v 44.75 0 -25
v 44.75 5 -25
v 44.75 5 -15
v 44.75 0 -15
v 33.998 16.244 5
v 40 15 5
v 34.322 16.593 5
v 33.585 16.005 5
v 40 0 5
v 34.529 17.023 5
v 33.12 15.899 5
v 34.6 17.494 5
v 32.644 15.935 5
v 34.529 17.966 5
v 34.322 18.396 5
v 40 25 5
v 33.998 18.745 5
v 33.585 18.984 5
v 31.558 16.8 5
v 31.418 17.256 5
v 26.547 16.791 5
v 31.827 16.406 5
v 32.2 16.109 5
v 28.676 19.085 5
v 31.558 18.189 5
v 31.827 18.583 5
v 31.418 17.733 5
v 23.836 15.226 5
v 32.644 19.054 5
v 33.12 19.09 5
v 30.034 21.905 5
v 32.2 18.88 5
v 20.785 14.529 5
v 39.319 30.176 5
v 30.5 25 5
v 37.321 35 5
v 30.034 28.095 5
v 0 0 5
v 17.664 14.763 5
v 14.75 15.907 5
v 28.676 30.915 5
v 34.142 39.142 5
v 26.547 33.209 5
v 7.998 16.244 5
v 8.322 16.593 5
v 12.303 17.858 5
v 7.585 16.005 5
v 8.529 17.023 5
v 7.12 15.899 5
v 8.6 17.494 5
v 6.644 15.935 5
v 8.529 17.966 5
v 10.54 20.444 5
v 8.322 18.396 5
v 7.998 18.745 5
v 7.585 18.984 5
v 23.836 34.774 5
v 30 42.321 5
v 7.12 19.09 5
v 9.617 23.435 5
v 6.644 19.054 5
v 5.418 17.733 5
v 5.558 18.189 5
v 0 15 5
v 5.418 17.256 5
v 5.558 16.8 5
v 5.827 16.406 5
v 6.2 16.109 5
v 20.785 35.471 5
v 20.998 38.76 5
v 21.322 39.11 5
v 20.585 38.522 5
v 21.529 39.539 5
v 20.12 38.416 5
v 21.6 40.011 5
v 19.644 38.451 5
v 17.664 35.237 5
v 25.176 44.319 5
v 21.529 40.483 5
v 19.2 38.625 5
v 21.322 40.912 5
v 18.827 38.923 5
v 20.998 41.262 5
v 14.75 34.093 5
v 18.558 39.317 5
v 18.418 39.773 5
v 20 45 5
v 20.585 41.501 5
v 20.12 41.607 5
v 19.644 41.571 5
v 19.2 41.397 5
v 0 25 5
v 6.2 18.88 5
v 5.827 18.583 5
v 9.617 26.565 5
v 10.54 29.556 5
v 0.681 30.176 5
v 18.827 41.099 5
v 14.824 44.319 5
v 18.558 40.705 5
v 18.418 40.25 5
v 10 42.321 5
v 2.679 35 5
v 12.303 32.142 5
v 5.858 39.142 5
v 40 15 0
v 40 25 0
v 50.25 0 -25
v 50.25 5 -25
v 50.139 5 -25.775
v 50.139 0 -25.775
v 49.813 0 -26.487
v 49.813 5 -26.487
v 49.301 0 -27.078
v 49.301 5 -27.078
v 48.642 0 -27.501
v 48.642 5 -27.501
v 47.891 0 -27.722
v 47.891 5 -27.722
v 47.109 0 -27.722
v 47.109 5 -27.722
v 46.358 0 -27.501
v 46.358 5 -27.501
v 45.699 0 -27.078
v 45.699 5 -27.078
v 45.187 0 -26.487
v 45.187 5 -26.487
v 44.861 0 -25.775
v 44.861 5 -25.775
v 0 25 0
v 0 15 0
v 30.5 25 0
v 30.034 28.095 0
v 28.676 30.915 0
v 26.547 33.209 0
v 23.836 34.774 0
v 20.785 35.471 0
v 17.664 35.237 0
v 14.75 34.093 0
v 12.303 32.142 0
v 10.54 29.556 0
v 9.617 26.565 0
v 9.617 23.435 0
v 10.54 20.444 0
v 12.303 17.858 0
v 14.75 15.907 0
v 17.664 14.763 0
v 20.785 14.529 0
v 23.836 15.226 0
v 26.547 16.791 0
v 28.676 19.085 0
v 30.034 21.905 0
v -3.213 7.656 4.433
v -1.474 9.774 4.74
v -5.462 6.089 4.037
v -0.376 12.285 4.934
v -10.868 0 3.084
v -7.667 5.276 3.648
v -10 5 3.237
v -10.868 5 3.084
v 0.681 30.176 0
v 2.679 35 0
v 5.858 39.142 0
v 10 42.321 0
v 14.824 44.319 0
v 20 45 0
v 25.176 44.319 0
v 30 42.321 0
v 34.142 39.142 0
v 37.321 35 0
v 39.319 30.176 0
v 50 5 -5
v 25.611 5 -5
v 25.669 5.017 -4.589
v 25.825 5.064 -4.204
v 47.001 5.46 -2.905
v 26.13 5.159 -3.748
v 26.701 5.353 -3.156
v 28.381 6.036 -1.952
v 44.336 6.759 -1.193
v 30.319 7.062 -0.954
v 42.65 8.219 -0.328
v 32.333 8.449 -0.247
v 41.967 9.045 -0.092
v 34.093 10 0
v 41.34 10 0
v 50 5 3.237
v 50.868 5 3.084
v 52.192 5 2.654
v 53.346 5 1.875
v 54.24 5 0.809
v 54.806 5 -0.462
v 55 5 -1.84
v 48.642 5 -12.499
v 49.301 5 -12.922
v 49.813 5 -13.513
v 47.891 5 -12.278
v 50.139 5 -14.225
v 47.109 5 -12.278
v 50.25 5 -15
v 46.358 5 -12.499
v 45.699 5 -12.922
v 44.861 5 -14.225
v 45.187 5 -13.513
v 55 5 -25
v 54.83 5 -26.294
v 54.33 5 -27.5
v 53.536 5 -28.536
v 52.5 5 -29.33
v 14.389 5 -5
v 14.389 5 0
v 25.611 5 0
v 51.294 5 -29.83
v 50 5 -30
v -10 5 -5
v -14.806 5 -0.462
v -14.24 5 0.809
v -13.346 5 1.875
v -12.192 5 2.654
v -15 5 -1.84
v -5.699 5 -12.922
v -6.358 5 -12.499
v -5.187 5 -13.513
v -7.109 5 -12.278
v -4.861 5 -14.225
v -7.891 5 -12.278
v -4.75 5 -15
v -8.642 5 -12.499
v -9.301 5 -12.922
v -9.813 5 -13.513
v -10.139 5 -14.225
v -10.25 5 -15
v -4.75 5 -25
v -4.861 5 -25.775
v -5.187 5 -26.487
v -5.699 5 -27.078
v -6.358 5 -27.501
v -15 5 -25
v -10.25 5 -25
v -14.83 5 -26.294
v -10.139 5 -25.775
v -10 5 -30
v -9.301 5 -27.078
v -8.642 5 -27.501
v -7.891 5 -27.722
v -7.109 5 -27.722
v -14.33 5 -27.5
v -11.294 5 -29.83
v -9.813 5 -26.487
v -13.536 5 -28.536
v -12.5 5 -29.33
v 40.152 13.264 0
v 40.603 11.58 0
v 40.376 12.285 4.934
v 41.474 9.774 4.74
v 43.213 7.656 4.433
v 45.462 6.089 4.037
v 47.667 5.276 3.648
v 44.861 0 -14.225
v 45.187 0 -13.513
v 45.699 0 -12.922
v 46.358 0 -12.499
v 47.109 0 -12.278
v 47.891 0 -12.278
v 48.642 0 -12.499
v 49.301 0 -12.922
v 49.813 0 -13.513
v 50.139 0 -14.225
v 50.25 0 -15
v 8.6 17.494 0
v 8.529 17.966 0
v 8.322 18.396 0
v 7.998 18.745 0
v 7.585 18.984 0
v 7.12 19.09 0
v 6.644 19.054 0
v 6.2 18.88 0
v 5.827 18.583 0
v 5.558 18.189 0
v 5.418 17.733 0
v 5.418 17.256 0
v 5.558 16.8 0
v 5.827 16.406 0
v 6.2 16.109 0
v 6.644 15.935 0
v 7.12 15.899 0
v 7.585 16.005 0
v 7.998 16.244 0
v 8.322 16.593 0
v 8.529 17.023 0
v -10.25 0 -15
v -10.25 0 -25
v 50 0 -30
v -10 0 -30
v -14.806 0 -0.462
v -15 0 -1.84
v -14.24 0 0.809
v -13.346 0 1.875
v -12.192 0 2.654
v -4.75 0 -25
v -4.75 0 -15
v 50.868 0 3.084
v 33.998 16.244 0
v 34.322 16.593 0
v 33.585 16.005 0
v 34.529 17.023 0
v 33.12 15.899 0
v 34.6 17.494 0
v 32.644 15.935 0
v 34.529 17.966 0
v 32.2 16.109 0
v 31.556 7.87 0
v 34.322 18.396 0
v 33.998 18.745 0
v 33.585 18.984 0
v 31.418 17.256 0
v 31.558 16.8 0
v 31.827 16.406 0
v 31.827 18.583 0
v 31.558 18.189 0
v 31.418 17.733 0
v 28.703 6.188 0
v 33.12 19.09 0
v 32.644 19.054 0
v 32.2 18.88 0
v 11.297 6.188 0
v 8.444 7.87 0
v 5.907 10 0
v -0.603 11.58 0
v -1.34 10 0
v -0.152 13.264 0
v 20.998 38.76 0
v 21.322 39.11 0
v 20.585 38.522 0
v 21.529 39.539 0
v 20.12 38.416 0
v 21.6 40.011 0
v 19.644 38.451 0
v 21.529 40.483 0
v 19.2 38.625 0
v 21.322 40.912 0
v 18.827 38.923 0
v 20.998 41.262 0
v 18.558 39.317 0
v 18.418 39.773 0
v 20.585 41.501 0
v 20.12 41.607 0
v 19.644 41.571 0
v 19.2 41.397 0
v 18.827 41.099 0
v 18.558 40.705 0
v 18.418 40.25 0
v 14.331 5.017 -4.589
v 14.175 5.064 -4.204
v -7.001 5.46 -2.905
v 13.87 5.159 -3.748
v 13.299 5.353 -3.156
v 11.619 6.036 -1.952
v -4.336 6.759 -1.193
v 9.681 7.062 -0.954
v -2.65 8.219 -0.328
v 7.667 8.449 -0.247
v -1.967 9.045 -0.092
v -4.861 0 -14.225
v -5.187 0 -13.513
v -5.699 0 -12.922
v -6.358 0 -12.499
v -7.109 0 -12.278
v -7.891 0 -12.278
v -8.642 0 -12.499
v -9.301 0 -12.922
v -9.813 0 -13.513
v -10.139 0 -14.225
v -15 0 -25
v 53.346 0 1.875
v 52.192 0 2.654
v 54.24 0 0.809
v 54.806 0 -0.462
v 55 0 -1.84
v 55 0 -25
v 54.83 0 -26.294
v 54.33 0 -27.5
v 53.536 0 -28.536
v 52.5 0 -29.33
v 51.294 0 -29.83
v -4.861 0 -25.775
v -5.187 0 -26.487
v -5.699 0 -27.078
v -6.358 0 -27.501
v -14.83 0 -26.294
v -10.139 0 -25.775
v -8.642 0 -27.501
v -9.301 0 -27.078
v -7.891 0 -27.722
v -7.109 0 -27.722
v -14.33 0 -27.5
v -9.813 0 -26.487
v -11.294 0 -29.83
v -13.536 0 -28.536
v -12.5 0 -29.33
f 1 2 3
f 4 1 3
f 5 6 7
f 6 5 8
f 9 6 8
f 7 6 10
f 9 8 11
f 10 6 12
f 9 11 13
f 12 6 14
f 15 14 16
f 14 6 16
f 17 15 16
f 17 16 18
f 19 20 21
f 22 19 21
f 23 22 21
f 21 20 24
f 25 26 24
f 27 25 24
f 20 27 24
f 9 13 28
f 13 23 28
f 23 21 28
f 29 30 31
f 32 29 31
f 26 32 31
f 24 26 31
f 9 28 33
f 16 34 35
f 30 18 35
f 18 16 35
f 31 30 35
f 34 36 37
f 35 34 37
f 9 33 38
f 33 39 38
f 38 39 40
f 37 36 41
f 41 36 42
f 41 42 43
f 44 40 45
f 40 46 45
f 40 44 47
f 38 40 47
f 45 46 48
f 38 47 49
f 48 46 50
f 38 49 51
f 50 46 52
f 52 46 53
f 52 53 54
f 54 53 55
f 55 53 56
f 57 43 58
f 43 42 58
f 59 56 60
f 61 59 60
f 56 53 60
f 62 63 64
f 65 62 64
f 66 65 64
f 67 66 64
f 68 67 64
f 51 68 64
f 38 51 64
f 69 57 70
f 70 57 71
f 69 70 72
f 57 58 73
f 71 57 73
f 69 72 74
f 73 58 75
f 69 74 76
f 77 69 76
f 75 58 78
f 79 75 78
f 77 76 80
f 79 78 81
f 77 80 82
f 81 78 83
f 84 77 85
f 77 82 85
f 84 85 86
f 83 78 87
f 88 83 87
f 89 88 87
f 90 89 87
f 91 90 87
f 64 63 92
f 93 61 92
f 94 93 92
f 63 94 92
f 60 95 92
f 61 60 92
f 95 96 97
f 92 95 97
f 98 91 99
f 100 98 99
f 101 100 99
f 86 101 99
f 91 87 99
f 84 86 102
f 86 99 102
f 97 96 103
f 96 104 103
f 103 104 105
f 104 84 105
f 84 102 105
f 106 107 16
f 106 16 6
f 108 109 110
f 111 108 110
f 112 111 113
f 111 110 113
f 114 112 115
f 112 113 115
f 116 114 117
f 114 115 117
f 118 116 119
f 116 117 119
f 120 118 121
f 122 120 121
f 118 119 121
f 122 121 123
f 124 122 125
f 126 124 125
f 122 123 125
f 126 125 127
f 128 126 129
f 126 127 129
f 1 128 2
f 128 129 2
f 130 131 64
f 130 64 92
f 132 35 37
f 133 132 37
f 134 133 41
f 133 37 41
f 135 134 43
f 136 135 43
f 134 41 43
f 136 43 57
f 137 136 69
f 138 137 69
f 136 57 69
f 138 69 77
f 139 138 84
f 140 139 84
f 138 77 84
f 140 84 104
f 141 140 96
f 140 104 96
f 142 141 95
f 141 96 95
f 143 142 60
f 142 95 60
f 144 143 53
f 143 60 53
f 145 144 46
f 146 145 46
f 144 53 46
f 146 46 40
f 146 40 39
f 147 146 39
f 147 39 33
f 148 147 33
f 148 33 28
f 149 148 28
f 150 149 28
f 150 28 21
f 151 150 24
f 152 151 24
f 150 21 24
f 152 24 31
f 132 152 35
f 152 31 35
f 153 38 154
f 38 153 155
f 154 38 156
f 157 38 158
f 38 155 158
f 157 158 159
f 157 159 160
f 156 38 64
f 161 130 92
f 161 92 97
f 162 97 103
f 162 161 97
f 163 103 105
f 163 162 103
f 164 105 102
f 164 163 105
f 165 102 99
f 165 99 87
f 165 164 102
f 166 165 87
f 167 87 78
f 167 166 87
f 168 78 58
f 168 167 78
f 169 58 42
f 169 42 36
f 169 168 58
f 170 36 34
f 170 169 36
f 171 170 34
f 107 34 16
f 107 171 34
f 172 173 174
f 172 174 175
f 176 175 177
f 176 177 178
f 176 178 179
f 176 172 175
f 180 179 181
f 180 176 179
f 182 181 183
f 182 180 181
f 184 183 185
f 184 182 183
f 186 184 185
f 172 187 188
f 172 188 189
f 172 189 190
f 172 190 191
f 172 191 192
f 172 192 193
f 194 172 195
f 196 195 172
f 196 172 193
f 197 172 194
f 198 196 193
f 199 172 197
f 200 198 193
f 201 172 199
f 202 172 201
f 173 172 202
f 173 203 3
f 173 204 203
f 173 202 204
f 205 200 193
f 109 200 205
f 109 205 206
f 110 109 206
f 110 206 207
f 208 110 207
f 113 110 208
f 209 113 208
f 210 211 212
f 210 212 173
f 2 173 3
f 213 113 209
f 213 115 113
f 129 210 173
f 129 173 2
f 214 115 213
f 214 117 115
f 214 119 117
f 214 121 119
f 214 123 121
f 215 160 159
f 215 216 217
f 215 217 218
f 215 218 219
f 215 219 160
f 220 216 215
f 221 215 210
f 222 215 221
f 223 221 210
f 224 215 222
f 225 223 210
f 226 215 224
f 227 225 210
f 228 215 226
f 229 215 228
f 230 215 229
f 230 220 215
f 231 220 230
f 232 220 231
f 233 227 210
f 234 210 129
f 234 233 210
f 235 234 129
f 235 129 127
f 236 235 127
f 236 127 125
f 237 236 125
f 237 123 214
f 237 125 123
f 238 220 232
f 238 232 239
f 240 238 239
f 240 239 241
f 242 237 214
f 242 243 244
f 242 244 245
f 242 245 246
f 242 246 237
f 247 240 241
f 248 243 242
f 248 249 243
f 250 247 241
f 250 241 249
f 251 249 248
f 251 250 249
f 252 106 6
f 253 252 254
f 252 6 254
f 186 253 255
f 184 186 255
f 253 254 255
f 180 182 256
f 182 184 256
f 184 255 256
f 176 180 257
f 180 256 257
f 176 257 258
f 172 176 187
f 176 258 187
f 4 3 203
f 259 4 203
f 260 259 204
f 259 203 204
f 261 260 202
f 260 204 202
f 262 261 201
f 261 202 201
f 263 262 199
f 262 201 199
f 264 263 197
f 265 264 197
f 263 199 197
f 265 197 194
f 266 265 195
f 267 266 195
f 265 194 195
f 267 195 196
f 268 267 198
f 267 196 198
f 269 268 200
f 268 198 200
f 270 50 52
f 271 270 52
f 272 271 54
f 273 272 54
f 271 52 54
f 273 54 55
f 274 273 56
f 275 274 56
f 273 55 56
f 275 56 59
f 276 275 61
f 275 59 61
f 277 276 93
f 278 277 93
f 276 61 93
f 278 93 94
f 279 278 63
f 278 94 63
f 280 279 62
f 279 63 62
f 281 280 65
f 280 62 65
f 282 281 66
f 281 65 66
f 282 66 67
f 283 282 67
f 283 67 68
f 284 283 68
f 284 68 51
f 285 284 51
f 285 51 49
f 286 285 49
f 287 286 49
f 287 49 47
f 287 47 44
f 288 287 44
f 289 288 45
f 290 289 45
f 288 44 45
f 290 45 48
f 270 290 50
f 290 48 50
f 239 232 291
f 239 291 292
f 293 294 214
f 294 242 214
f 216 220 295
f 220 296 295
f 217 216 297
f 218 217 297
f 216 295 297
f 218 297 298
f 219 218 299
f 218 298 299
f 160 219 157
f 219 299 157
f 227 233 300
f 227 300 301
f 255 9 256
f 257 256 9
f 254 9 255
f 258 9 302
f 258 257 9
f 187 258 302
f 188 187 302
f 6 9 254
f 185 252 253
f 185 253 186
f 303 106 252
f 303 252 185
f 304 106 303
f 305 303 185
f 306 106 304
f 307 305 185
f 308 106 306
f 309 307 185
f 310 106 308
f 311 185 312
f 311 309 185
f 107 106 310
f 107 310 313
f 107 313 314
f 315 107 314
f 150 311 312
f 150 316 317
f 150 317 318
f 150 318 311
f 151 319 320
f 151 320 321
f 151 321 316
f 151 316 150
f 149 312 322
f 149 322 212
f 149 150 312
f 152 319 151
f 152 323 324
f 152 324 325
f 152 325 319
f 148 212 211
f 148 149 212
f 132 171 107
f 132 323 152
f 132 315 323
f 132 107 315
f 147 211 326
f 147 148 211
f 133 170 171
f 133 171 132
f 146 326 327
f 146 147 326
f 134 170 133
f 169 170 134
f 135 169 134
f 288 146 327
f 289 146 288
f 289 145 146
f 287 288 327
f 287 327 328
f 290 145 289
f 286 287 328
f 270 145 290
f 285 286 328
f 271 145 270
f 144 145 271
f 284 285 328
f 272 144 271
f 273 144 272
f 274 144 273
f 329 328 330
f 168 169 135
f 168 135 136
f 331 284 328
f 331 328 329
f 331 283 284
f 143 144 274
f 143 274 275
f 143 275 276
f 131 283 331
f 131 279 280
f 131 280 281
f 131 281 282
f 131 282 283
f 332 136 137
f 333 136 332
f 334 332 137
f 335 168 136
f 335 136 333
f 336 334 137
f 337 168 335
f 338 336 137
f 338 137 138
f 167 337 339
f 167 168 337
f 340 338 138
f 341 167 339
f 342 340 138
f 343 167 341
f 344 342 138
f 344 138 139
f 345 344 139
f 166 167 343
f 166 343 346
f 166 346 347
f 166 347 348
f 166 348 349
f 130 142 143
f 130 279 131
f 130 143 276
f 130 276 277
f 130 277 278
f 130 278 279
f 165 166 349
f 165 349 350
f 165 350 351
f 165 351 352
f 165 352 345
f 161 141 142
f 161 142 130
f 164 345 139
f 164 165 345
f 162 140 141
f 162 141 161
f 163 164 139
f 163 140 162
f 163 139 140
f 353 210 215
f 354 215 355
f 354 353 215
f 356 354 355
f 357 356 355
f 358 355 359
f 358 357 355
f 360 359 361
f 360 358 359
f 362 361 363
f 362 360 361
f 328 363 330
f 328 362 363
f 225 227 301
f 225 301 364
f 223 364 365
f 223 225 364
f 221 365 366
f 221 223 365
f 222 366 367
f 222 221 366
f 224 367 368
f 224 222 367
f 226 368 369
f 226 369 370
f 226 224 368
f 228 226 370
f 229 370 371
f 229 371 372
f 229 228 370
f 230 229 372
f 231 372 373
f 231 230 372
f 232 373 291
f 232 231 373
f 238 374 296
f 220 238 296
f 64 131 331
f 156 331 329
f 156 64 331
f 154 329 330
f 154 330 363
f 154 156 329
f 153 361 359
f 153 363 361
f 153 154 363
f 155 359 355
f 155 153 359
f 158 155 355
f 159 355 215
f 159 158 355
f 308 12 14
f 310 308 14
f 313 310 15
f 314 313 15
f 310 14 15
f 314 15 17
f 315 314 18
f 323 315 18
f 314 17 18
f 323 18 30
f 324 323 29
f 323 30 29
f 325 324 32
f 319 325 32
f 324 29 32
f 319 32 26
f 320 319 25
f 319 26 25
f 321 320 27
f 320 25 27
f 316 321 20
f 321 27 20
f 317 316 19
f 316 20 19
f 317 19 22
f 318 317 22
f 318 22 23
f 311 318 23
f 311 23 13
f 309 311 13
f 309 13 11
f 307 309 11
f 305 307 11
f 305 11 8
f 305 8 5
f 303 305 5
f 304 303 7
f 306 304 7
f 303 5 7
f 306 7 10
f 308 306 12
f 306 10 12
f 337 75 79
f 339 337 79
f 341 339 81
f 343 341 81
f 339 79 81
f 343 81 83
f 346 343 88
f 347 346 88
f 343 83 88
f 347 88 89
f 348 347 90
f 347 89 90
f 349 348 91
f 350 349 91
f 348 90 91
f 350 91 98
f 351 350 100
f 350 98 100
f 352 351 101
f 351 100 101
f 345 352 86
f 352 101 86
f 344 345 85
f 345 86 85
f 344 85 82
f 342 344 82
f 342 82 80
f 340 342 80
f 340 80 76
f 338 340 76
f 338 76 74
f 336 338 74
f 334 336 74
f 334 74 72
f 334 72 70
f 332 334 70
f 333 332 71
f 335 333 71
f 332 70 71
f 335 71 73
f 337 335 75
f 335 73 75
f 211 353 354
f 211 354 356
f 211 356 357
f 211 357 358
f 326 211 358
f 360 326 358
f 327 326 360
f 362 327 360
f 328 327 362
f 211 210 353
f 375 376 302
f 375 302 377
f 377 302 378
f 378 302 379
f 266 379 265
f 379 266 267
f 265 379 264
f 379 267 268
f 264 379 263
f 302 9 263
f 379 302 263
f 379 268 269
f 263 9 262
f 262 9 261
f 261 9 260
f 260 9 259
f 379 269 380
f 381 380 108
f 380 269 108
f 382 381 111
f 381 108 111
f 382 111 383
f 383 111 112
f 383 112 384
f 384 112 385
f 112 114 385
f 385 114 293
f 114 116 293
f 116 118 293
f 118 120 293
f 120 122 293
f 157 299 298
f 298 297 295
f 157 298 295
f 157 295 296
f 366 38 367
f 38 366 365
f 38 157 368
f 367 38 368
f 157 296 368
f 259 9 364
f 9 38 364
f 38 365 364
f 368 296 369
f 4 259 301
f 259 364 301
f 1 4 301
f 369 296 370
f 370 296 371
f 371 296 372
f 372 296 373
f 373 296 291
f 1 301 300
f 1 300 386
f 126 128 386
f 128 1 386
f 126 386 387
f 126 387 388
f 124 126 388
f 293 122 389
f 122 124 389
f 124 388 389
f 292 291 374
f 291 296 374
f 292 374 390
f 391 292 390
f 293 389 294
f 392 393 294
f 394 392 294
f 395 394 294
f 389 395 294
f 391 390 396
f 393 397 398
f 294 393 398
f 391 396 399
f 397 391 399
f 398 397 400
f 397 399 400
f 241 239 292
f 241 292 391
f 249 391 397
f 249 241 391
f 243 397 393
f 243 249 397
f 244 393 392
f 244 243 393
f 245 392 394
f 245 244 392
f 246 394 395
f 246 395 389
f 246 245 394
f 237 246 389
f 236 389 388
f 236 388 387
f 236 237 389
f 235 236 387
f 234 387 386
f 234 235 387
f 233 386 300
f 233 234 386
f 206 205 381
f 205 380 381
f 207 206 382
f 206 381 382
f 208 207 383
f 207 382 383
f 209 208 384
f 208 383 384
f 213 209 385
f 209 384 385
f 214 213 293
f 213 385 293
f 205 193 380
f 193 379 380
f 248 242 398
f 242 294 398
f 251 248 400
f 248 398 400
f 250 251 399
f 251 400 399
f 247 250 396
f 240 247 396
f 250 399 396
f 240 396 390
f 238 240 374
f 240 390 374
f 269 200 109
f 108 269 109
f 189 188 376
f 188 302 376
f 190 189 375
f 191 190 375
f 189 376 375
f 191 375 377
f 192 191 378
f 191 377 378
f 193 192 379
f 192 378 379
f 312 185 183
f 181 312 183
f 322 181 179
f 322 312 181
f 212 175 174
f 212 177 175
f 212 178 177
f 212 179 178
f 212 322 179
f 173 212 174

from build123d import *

# Parameters (mm, degrees)
SKETCH1_W           = 40
SKETCH1_H           = 30
BOSS_EXTRUDE1_DEPTH = 5
BOSS_EXTRUDE2_DEPTH = 5
SKETCH4_R           = 10.5
SKETCH4_R_2         = 1.6
CUT_EXTRUDE2_DEPTH  = 5
SKETCH5_W           = 15
SKETCH5_H           = 30
BOSS_EXTRUDE3_DEPTH = 5
CHAMFER1_SIZE       = 5
CHAMFER1_SIZE_2     = 28.356409098
CHAMFER2_SIZE       = 5
CHAMFER2_SIZE_2     = 28.356409098
FILLET1_R           = 10
FILLET2_R           = 5
FILLET4_R           = 5
CUT_EXTRUDE3_DEPTH  = 78.136243103


with BuildPart() as part:
    # Sketch1 → Boss-Extrude1 (new body)
    with BuildSketch(Plane(origin=(0, 0, 0), x_dir=(1, 0, 0), z_dir=(0, 1, 0))):
        with Locations((20, 15)):
            Rectangle(SKETCH1_W, SKETCH1_H)
    extrude(amount=BOSS_EXTRUDE1_DEPTH)

    # Sketch2 → Boss-Extrude2 (add)
    with BuildSketch(Plane.XY):
        with BuildLine():
            Line((0, 5), (0, 25))
            ThreePointArc((0, 25), (20, 45), (40, 25))
            Line((40, 25), (40, 5))
            Line((40, 5), (40, 0))
            Line((40, 0), (0, 0))
            Line((0, 0), (0, 5))
        make_face()
    extrude(amount=BOSS_EXTRUDE2_DEPTH)

    # Sketch4 → Cut-Extrude2 (cut)
    with BuildSketch(Plane.XY.offset(5)):
        with Locations((20, 25)):
            Circle(SKETCH4_R)
        with Locations((20, 40.011106999)):
            Circle(SKETCH4_R_2)
        with Locations((7, 17.494446501)):
            Circle(SKETCH4_R_2)
        with Locations((33, 17.494446501)):
            Circle(SKETCH4_R_2)
    extrude(amount=-CUT_EXTRUDE2_DEPTH, mode=Mode.SUBTRACT)

    # Sketch5 → Boss-Extrude3 (add)
    # profile 1 of 2: a face of its own
    with BuildSketch(Plane(origin=(0, 5, 0), x_dir=(1, 0, 0), z_dir=(0, 1, 0))):
        with Locations((-7.5, 15)):
            Rectangle(SKETCH5_W, SKETCH5_H)
        with BuildLine():
            Line((-10.25, 15), (-10.25, 25))
            ThreePointArc((-10.25, 25), (-7.5, 27.75), (-4.75, 25))
            Line((-4.75, 25), (-4.75, 15))
            ThreePointArc((-4.75, 15), (-7.5, 12.25), (-10.25, 15))
        make_face(mode=Mode.SUBTRACT)
    # profile 2 of 2: a face of its own
    with BuildSketch(Plane(origin=(0, 5, 0), x_dir=(1, 0, 0), z_dir=(0, 1, 0))):
        with Locations((47.5, 15)):
            Rectangle(SKETCH5_W, SKETCH5_H)
        with BuildLine():
            Line((50.25, 15), (50.25, 25))
            ThreePointArc((50.25, 25), (47.5, 27.75), (44.75, 25))
            Line((44.75, 25), (44.75, 15))
            ThreePointArc((44.75, 15), (47.5, 12.25), (50.25, 15))
        make_face(mode=Mode.SUBTRACT)
    extrude(amount=-BOSS_EXTRUDE3_DEPTH)

    # Chamfer1
    # the kernel refuses this chamfer: 28.356409098, 5 mm, written as the material it adds along each edge
    with BuildSketch(Plane(origin=(0, 5, 0), x_dir=(0.21013876076743523, 0, 0.9776715712462578), z_dir=(0, -1, 0))) as chamfer1_piece_1_section:
        Polygon((CHAMFER1_SIZE * 0.977671571246, CHAMFER1_SIZE * 0.210138760767), (-CHAMFER1_SIZE_2 * 0.210138760768, CHAMFER1_SIZE_2 * 0.977671571249), (0, 0), align=None)
    chamfer1_piece_1 = extrude(amount=5, mode=Mode.PRIVATE)
    chamfer1_piece_1 = split(chamfer1_piece_1, bisect_by=Plane(origin=(-6.173112567, 2.5, 5), z_dir=(0, 0, -1)), keep=Keep.TOP, mode=Mode.PRIVATE)
    chamfer1_piece_1 = split(chamfer1_piece_1, bisect_by=Plane(origin=(-15, 2.5, 1.987176297), z_dir=(1, 0, 0)), keep=Keep.TOP, mode=Mode.PRIVATE)
    add(chamfer1_piece_1)

    # Chamfer2
    # the kernel refuses this chamfer: 28.356409098, 5 mm, written as the material it adds along each edge
    with BuildSketch(Plane(origin=(40, 5, 0), x_dir=(-0.2101387607674354, 0, 0.9776715712462578), z_dir=(0, -1, 0))) as chamfer2_piece_1_section:
        Polygon((CHAMFER2_SIZE * 0.977671571246, -CHAMFER2_SIZE * 0.210138760767), (-CHAMFER2_SIZE_2 * 0.210138760768, -CHAMFER2_SIZE_2 * 0.977671571249), (0, 0), align=None)
    chamfer2_piece_1 = extrude(amount=5, mode=Mode.PRIVATE)
    chamfer2_piece_1 = split(chamfer2_piece_1, bisect_by=Plane(origin=(46.173112567, 2.5, 5), z_dir=(0, 0, -1)), keep=Keep.TOP, mode=Mode.PRIVATE)
    chamfer2_piece_1 = split(chamfer2_piece_1, bisect_by=Plane(origin=(55, 2.5, 1.987176297), z_dir=(-1, 0, 0)), keep=Keep.TOP, mode=Mode.PRIVATE)
    add(chamfer2_piece_1)

    # Fillet1
    fillet1_edges = [part.edges().sort_by_distance(p)[0] for p in [
        (40, 5, 2.5),
        (0, 5, 2.5),
    ]]
    fillet(fillet1_edges, radius=FILLET1_R)

    # Fillet2
    fillet2_edges = [part.edges().sort_by_distance(p)[0] for p in [
        (55, 2.5, 2.355095289),
        (-15, 2.5, -30),
        (55, 2.5, -30),
        (-15, 2.5, 2.355095289),
    ]]
    fillet(fillet2_edges, radius=FILLET2_R)

    # Fillet4
    fillet4_edges = [part.edges().sort_by_distance(p)[0] for p in [
        (20, 5, 0),
    ]]
    fillet(fillet4_edges, radius=FILLET4_R)

    # Sketch6 → Cut-Extrude3 (cut, through all)
    with BuildSketch(Plane(origin=(0, 0, 0), x_dir=(-1, 0, 0), z_dir=(0, 0, -1))):
        with BuildLine():
            Line((-25.611038109, 5), (-14.388961891, 5))
            ThreePointArc((-14.388961891, 5), (-3.752498092, 12.523671995), (0, 25))
            ThreePointArc((0, 25), (-20, 45), (-40, 25))
            ThreePointArc((-40, 25), (-36.247501908, 12.523671995), (-25.611038109, 5))
        make_face()
    extrude(amount=CUT_EXTRUDE3_DEPTH, mode=Mode.SUBTRACT)


solid = part.part
